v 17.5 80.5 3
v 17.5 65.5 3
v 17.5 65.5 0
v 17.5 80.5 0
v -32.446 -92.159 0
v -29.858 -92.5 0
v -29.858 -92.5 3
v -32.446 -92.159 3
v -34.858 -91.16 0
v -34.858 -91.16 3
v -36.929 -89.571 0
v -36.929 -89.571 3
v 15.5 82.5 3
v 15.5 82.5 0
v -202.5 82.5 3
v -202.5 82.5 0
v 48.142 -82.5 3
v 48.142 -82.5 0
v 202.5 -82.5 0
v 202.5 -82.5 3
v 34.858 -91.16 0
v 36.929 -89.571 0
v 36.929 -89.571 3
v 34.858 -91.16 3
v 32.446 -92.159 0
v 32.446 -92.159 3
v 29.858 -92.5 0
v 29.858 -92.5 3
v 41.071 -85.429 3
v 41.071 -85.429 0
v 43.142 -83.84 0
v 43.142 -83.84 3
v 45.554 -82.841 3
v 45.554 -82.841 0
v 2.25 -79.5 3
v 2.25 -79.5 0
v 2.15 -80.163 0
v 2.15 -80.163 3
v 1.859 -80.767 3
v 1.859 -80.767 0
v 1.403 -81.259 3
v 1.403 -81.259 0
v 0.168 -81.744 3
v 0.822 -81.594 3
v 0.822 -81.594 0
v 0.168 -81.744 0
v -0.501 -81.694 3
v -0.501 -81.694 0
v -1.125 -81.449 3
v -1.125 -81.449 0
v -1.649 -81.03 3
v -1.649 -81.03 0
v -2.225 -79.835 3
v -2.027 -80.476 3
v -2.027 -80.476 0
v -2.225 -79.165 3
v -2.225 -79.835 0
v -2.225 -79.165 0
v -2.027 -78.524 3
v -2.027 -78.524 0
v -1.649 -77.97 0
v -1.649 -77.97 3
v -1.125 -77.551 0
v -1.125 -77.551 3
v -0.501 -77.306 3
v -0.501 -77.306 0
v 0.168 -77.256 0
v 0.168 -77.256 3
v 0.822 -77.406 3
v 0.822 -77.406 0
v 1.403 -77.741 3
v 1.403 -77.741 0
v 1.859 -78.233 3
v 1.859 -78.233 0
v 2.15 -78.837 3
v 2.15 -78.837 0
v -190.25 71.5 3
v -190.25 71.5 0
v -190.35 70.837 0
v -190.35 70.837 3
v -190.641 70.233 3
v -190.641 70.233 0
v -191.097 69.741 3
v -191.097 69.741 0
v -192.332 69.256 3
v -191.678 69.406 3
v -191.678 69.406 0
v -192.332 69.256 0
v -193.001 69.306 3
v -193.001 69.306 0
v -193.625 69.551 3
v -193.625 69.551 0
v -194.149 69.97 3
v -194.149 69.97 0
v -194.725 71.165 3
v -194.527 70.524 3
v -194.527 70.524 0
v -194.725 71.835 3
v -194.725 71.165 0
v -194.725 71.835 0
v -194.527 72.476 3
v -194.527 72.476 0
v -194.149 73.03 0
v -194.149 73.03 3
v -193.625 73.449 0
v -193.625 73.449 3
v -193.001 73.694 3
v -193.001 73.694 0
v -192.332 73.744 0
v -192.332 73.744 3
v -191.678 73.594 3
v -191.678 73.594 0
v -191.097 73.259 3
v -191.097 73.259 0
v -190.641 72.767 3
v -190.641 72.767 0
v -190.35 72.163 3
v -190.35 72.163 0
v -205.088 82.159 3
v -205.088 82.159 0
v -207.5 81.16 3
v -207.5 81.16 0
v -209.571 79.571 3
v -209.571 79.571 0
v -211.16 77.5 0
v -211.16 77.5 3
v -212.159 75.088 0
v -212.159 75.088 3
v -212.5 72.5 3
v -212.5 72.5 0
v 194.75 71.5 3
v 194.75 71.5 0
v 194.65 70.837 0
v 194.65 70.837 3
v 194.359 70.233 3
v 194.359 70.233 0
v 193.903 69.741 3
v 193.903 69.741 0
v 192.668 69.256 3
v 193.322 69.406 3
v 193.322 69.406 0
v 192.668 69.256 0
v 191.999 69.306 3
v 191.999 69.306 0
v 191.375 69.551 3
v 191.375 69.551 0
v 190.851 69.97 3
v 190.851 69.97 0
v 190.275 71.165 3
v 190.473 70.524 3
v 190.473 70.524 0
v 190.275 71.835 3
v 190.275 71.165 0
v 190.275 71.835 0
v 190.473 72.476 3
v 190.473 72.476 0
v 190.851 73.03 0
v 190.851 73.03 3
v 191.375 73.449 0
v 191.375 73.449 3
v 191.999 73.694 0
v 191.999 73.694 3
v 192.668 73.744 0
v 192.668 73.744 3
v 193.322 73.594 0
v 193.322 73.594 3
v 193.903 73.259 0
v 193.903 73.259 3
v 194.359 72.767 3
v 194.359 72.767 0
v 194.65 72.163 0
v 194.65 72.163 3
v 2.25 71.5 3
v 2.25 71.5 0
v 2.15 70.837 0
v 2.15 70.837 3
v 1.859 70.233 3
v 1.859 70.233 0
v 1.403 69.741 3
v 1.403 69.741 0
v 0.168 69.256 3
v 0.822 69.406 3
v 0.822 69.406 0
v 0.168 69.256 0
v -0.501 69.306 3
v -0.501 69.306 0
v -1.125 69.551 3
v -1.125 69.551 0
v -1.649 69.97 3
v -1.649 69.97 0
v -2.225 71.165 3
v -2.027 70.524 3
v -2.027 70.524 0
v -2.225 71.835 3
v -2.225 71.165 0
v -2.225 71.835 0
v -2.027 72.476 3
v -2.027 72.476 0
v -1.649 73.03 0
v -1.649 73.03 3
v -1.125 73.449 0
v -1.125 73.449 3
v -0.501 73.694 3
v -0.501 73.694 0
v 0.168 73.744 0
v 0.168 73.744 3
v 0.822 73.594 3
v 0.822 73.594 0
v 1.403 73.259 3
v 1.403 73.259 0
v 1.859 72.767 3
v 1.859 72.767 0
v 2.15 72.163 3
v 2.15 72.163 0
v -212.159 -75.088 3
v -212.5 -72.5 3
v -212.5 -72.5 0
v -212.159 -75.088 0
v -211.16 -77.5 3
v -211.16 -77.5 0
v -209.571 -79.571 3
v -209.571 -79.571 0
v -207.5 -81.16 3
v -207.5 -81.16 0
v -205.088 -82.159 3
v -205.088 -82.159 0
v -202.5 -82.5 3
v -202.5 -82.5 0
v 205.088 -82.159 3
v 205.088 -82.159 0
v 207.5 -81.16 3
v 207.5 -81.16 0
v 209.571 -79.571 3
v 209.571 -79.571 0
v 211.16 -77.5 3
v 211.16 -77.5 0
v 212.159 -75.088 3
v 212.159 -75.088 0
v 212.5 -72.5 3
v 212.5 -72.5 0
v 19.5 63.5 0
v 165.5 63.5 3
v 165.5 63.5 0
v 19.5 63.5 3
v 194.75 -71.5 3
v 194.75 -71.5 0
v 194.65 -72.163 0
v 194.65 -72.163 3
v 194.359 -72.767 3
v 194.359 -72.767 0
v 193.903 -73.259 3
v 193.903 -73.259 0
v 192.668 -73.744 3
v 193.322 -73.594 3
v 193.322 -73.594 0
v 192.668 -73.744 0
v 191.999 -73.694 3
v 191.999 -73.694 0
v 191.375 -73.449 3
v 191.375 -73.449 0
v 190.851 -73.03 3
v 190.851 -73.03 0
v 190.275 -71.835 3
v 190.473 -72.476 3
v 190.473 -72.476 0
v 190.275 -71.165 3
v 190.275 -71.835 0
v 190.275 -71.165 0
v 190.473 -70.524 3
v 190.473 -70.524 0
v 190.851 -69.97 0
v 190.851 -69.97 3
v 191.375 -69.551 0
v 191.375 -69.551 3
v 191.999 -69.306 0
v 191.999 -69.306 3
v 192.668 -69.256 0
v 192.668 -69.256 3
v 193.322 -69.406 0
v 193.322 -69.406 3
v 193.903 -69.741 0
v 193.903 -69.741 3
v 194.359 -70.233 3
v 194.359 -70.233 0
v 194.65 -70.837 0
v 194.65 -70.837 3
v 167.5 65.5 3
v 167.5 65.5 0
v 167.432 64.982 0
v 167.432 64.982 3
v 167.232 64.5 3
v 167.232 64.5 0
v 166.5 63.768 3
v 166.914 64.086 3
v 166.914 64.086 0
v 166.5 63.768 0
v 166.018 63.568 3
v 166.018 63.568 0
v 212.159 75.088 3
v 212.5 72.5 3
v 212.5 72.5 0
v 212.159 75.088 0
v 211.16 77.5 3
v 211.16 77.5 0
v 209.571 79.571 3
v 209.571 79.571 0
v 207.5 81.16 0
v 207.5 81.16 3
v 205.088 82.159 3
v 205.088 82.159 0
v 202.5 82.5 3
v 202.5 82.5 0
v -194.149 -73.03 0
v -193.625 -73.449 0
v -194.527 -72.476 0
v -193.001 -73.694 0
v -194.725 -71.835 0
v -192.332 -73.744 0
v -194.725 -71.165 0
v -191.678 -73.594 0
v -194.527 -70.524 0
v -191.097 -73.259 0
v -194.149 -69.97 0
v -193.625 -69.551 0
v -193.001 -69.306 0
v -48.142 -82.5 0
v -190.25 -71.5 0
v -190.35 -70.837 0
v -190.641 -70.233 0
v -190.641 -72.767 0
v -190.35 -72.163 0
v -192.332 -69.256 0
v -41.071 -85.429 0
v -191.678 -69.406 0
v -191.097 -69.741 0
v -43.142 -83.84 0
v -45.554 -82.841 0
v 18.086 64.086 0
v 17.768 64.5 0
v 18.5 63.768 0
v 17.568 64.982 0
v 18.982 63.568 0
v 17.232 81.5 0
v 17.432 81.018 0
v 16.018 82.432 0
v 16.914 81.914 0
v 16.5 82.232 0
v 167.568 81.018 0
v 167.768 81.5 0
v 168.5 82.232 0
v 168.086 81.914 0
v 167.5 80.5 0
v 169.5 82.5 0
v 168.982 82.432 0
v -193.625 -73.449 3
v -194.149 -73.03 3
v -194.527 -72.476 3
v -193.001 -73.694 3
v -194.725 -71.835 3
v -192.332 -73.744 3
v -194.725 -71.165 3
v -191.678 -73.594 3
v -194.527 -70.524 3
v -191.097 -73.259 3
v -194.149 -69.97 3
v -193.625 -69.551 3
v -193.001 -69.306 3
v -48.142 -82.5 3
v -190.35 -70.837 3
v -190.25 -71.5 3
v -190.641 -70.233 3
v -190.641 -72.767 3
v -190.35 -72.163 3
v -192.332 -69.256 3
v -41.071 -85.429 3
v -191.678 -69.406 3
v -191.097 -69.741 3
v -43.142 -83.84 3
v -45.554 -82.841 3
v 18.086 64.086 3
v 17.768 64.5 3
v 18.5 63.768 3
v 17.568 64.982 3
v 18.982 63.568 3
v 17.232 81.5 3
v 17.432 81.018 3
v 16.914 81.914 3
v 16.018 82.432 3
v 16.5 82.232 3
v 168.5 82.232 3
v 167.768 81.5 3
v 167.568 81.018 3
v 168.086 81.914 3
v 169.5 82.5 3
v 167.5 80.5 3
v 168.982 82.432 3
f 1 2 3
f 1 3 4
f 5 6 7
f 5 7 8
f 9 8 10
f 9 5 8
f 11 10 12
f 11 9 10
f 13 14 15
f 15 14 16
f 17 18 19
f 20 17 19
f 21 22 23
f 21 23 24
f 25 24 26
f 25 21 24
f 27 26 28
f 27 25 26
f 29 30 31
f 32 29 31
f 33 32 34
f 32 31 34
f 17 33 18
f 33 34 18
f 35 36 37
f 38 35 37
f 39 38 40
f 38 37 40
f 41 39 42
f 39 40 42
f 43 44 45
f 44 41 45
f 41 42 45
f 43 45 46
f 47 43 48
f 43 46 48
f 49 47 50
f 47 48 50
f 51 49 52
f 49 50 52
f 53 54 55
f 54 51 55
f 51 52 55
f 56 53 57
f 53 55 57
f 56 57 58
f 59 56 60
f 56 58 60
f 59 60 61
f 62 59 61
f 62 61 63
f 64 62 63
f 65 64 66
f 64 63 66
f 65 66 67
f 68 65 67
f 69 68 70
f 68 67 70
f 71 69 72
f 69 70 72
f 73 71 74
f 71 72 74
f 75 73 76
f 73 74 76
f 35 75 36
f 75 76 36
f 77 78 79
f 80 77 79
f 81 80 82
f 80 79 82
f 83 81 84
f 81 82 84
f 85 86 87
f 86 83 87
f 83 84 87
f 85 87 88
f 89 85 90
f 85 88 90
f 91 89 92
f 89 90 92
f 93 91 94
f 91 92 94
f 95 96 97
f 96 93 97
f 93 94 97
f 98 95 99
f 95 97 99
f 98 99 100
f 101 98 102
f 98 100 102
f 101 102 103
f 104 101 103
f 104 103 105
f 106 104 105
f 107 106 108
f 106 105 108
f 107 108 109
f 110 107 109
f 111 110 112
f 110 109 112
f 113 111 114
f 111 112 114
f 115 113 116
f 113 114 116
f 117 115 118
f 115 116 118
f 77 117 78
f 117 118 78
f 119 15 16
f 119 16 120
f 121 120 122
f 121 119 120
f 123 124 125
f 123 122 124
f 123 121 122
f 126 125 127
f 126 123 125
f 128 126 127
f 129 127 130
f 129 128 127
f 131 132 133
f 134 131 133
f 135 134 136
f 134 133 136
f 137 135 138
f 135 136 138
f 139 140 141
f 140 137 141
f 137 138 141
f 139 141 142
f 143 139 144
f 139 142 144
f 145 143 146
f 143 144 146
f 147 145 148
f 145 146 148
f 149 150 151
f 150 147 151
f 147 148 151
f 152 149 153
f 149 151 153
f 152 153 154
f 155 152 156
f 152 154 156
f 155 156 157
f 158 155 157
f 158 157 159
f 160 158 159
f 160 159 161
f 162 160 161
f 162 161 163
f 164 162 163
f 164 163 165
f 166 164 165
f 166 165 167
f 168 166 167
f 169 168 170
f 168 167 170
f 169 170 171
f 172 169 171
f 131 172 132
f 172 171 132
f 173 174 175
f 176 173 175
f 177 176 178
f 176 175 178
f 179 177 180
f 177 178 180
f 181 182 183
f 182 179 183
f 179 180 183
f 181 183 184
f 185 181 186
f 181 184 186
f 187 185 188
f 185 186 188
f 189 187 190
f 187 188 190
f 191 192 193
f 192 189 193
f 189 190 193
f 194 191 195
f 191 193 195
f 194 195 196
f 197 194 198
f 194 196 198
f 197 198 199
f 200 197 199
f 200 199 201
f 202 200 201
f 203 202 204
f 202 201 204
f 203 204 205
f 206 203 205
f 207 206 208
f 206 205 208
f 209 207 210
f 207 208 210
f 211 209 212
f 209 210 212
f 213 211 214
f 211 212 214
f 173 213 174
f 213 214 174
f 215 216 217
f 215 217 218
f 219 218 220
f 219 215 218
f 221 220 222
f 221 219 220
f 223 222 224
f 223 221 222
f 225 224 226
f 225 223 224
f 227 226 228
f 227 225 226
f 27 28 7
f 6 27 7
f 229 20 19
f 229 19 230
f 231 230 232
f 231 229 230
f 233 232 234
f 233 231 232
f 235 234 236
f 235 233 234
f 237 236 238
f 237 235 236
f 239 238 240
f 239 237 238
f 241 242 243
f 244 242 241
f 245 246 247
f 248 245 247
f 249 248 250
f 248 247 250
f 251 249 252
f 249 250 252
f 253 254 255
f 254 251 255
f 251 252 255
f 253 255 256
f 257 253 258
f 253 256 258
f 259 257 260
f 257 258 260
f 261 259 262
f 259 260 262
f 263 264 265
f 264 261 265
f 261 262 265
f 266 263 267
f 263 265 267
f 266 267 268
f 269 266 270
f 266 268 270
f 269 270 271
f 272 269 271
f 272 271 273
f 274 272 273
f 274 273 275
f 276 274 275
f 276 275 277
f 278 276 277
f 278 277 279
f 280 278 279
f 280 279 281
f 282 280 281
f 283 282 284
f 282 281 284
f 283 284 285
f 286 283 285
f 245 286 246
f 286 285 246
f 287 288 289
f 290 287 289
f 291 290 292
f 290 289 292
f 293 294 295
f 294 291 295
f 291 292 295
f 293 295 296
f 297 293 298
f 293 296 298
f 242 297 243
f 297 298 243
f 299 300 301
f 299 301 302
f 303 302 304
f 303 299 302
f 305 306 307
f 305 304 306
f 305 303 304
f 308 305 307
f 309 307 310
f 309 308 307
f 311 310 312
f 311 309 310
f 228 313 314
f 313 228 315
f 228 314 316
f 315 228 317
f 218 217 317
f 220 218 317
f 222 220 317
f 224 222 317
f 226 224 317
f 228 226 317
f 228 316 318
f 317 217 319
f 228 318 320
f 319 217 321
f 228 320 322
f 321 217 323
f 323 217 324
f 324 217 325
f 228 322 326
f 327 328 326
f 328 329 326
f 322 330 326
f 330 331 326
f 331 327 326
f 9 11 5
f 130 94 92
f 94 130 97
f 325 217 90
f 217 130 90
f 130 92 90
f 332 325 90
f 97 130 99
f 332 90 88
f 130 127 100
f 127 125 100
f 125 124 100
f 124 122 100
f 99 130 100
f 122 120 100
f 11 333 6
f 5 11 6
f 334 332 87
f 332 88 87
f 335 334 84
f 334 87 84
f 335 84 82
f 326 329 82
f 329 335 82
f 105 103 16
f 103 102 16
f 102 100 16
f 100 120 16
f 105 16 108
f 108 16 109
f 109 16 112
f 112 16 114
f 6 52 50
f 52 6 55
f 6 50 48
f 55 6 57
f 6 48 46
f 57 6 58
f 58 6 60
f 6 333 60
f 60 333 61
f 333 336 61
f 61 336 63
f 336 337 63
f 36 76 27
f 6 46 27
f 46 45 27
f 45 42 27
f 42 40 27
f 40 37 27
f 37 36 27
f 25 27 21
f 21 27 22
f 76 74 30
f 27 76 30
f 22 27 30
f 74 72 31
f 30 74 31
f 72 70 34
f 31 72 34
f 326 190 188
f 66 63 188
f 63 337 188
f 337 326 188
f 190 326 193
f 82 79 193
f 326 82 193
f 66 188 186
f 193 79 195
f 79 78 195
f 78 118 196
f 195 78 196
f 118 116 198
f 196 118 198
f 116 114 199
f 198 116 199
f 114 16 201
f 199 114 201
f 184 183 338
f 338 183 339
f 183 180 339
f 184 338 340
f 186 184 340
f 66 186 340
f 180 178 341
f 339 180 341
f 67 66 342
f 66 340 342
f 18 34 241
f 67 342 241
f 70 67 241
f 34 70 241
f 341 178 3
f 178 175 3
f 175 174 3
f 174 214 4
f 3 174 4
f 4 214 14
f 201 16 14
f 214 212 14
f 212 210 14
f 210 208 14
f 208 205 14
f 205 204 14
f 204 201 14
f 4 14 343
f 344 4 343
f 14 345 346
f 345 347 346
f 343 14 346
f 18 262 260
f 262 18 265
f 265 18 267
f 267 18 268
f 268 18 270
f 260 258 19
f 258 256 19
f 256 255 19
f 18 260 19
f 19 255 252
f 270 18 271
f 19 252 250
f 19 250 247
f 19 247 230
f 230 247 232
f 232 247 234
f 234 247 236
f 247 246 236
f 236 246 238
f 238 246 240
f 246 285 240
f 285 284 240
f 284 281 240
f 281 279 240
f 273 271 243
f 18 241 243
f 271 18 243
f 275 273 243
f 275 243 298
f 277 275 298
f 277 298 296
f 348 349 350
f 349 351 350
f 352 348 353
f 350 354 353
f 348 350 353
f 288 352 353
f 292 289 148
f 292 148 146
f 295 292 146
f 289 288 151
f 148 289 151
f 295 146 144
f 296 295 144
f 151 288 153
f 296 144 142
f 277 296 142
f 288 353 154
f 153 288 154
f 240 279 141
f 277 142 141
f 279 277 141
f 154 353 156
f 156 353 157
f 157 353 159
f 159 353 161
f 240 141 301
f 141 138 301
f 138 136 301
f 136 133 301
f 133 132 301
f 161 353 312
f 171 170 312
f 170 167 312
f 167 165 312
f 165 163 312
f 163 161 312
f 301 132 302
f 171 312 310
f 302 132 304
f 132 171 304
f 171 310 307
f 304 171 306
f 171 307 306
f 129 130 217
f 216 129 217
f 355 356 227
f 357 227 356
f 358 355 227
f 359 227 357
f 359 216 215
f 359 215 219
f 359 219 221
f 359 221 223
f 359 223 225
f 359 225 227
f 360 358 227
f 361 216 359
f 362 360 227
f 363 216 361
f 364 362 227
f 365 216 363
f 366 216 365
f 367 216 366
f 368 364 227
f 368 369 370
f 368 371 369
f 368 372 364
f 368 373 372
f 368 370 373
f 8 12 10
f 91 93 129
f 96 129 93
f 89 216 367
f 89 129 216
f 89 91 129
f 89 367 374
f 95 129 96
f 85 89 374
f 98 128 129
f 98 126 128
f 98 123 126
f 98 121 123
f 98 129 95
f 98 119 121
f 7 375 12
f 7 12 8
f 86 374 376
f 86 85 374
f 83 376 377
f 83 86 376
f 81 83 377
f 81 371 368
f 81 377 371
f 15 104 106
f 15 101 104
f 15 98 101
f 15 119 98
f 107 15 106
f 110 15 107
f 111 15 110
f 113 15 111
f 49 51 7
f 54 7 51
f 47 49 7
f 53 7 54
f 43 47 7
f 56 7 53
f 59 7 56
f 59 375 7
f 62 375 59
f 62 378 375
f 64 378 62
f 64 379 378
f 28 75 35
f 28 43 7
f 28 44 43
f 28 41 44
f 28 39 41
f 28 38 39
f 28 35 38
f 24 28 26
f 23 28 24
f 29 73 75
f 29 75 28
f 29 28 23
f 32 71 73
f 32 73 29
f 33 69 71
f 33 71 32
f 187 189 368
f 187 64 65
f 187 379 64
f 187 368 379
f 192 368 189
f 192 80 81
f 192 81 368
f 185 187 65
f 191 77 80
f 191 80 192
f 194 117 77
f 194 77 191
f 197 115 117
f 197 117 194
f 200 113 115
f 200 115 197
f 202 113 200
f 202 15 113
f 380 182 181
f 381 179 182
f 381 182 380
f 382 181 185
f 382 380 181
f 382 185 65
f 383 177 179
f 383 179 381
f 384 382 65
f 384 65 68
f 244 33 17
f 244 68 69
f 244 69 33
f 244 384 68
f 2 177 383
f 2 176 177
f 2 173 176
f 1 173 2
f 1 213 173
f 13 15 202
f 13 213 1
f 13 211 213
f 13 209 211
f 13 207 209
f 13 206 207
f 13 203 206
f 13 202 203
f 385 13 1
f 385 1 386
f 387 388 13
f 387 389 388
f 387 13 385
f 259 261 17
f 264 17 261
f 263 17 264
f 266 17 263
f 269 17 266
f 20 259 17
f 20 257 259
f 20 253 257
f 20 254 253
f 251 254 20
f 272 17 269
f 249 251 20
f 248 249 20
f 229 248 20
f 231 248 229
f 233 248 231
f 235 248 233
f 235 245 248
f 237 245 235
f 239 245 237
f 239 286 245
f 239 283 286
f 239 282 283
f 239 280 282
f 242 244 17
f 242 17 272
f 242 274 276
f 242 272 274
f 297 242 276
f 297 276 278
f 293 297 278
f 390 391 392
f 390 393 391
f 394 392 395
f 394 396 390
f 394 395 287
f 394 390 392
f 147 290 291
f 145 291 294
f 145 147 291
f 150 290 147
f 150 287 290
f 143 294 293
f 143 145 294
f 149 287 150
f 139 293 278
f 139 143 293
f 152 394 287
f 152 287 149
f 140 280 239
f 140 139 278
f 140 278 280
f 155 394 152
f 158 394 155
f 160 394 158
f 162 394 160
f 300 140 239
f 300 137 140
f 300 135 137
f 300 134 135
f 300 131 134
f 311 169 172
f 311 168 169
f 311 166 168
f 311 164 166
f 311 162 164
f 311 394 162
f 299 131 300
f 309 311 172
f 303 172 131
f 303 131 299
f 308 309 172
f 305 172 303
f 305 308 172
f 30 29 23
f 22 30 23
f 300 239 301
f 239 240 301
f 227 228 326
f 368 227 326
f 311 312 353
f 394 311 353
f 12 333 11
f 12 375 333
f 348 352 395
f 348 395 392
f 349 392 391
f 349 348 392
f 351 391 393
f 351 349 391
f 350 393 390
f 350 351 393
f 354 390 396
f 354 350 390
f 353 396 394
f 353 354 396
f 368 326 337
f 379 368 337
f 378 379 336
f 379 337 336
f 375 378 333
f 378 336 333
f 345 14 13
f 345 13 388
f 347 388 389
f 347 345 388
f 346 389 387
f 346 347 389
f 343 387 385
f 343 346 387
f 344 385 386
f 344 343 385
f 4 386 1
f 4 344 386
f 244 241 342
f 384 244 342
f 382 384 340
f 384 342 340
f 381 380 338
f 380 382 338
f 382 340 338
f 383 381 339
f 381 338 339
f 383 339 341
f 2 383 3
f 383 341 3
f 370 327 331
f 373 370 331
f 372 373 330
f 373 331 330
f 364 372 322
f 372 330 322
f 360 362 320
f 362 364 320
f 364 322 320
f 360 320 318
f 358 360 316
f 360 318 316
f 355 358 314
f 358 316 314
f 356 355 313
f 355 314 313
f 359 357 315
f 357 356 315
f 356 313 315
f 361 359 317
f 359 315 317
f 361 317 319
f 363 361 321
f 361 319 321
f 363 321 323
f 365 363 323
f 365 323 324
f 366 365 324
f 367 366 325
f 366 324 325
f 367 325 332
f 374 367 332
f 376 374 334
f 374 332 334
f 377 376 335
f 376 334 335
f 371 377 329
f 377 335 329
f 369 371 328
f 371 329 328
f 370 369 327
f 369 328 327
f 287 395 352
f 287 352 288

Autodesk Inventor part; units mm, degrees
ref_plane "YZ Plane" through (0, 0, 0) normal (1, 0, 0) x (0, 1, 0)
ref_plane "XZ Plane" through (0, 0, 0) normal (0, 1, 0) x (-1, 0, 0)
ref_plane "XY Plane" through (0, 0, 0) normal (0, 0, 1) x (1, 0, 0)
sketch "Sketch1" plane through (0, 0, 0) normal (0, 0, 1) x (1, 0, 0)
  line L0 (-212.5, -82.5) -> (212.5, -82.5)
  line L1 (212.5, -82.5) -> (212.5, 82.5)
  line L2 (212.5, 82.5) -> (-212.5, 82.5)
  line L3 (-212.5, 82.5) -> (-212.5, -82.5)
  line L4 (-212.5, -82.5) -> (212.5, 82.5) construction
  line L5 (212.5, -82.5) -> (-212.5, 82.5) construction
  line L6 (0, 118.3995) -> (0, -118.3995) construction
  circle A0 centre (0, 71.5) radius 2.25
  circle A1 centre (-192.5, 71.5) radius 2.25
  line L7 (-300.3995, 0) -> (300.3995, 0) projected
  circle A2 centre (192.5, 71.5) radius 2.25
  circle A3 centre (0, -71.5) radius 2.25 construction
  circle A4 centre (-192.5, -71.5) radius 2.25
  circle A5 centre (192.5, -71.5) radius 2.25
  line L8 (-194.25, 0.5) -> (-194.25, -40.0844) construction
  circle A6 centre (0, -79.5) radius 2.25
  point P0 (0, 0)
  dimension "d0" = 425
  dimension "d1" = 165
  dimension "d2" = 4.5
  dimension "d3" = 71.5
  dimension "d4" = 192.5
  dimension "d5" = 4.5
  dimension "d6" = 71.5
  dimension "d12" = 72
  dimension "d14" = 194.25
  dimension "d24" = 8
  dimension "d25" = 4.5
extrude "Extrusion1" add sketch "Sketch1" along normal blind 3
fillet "Fillet1" radius 10 4 edges at (-212.5, -82.5, 1.5) (-212.5, 82.5, 1.5) (212.5, -82.5, 1.5) (212.5, 82.5, 1.5)
sketch "Sketch3" plane through (0, 0, 3) normal (0, 0, 1) x (1, 0, 0)
  line L0 (17.5, 82.5) -> (167.5, 82.5)
  line L1 (167.5, 82.5) -> (167.5, 63.5)
  line L2 (167.5, 63.5) -> (17.5, 63.5)
  line L3 (17.5, 63.5) -> (17.5, 82.5)
  line L4 (202.5, 82.5) -> (-202.5, 82.5) projected
  line L5 (212.5, -72.5) -> (212.5, 72.5) projected
  point P0 (0, 0)
  dimension "d18" = 45
  dimension "d19" = 150
  dimension "d20" = 19
extrude "Extrusion2" cut sketch "Sketch3" against normal blind 3
fillet "Fillet2" radius 2 4 edges at (17.5, 63.5, 1.5) (17.5, 82.5, 1.5) (167.5, 82.5, 1.5) (167.5, 63.5, 1.5)
sketch "Sketch6" plane through (0, 0, 3) normal (0, 0, 1) x (1, 0, 0)
  line L0 (0, 117.5) -> (0, -127.5) projected
  line L1 (-202.5, -82.5) -> (202.5, -82.5) projected
  line L2 (-202.5, -82.5) -> (202.5, -82.5) projected
  line L3 (-44, -82.5) -> (-34, -92.5)
  line L4 (-34, -92.5) -> (0, -92.5)
  line L5 (44, -82.5) -> (34, -92.5)
  line L6 (34, -92.5) -> (0, -92.5)
  point P0 (0, 0)
  dimension "d26" = 45
  dimension "d27" = 10
extrude "Extrusion3" add sketch "Sketch6" against normal up to surface (3 mm away)
fillet "Fillet3" radius 10 4 edges at (-44, -82.5, 1.5) (-34, -92.5, 1.5) (34, -92.5, 1.5) (44, -82.5, 1.5)
sketch "Sketch7" plane through (0, 0, 3) normal (0, 0, 1) x (1, 0, 0)
  circle A0 centre (192.5, 71.5) radius 2.25 projected
  circle A1 centre (-192.5, 71.5) radius 2.25 projected
  circle A2 centre (0, 71.5) radius 2.25 projected
  circle A3 centre (-192.5, -71.5) radius 2.25 projected
  circle A4 centre (192.5, -71.5) radius 2.25 projected
  circle A5 centre (0, -79.5) radius 2.25 projected
  arc A6 (29.8579, -92.5) -> (36.9289, -89.5711) centre (29.8579, -82.5) ccw projected
  line L0 (36.9289, -89.5711) -> (41.0711, -85.4289) projected
  arc A7 (48.1421, -82.5) -> (41.0711, -85.4289) centre (48.1421, -92.5) ccw projected
  line L1 (48.1421, -82.5) -> (202.5, -82.5) projected
  arc A8 (202.5, -82.5) -> (212.5, -72.5) centre (202.5, -72.5) ccw projected
  line L2 (212.5, -72.5) -> (212.5, 72.5) projected
  arc A9 (212.5, 72.5) -> (202.5, 82.5) centre (202.5, 72.5) ccw projected
  line L3 (202.5, 82.5) -> (169.5, 82.5) projected
  arc A10 (169.5, 82.5) -> (167.5, 80.5) centre (169.5, 80.5) ccw projected
  line L4 (167.5, 80.5) -> (167.5, 65.5) projected
  arc A11 (165.5, 63.5) -> (167.5, 65.5) centre (165.5, 65.5) ccw projected
  line L5 (165.5, 63.5) -> (19.5, 63.5) projected
  arc A12 (17.5, 65.5) -> (19.5, 63.5) centre (19.5, 65.5) ccw projected
  line L6 (17.5, 65.5) -> (17.5, 80.5) projected
  arc A13 (17.5, 80.5) -> (15.5, 82.5) centre (15.5, 80.5) ccw projected
  line L7 (15.5, 82.5) -> (-202.5, 82.5) projected
  arc A14 (-202.5, 82.5) -> (-212.5, 72.5) centre (-202.5, 72.5) ccw projected
  line L8 (-212.5, 72.5) -> (-212.5, -72.5) projected
  arc A15 (-212.5, -72.5) -> (-202.5, -82.5) centre (-202.5, -72.5) ccw projected
  line L9 (-202.5, -82.5) -> (-48.1421, -82.5) projected
  arc A16 (-41.0711, -85.4289) -> (-48.1421, -82.5) centre (-48.1421, -92.5) ccw projected
  line L10 (-41.0711, -85.4289) -> (-36.9289, -89.5711) projected
  arc A17 (-36.9289, -89.5711) -> (-29.8579, -92.5) centre (-29.8579, -82.5) ccw projected
  line L11 (-29.8579, -92.5) -> (29.8579, -92.5) projected
  point P0 (0, 0)
equation "\"d5\" = d2"
equation "\"d6\" = d3"
equation "\"d25\" = d5"
properties part number "KeyBoardHolder"
